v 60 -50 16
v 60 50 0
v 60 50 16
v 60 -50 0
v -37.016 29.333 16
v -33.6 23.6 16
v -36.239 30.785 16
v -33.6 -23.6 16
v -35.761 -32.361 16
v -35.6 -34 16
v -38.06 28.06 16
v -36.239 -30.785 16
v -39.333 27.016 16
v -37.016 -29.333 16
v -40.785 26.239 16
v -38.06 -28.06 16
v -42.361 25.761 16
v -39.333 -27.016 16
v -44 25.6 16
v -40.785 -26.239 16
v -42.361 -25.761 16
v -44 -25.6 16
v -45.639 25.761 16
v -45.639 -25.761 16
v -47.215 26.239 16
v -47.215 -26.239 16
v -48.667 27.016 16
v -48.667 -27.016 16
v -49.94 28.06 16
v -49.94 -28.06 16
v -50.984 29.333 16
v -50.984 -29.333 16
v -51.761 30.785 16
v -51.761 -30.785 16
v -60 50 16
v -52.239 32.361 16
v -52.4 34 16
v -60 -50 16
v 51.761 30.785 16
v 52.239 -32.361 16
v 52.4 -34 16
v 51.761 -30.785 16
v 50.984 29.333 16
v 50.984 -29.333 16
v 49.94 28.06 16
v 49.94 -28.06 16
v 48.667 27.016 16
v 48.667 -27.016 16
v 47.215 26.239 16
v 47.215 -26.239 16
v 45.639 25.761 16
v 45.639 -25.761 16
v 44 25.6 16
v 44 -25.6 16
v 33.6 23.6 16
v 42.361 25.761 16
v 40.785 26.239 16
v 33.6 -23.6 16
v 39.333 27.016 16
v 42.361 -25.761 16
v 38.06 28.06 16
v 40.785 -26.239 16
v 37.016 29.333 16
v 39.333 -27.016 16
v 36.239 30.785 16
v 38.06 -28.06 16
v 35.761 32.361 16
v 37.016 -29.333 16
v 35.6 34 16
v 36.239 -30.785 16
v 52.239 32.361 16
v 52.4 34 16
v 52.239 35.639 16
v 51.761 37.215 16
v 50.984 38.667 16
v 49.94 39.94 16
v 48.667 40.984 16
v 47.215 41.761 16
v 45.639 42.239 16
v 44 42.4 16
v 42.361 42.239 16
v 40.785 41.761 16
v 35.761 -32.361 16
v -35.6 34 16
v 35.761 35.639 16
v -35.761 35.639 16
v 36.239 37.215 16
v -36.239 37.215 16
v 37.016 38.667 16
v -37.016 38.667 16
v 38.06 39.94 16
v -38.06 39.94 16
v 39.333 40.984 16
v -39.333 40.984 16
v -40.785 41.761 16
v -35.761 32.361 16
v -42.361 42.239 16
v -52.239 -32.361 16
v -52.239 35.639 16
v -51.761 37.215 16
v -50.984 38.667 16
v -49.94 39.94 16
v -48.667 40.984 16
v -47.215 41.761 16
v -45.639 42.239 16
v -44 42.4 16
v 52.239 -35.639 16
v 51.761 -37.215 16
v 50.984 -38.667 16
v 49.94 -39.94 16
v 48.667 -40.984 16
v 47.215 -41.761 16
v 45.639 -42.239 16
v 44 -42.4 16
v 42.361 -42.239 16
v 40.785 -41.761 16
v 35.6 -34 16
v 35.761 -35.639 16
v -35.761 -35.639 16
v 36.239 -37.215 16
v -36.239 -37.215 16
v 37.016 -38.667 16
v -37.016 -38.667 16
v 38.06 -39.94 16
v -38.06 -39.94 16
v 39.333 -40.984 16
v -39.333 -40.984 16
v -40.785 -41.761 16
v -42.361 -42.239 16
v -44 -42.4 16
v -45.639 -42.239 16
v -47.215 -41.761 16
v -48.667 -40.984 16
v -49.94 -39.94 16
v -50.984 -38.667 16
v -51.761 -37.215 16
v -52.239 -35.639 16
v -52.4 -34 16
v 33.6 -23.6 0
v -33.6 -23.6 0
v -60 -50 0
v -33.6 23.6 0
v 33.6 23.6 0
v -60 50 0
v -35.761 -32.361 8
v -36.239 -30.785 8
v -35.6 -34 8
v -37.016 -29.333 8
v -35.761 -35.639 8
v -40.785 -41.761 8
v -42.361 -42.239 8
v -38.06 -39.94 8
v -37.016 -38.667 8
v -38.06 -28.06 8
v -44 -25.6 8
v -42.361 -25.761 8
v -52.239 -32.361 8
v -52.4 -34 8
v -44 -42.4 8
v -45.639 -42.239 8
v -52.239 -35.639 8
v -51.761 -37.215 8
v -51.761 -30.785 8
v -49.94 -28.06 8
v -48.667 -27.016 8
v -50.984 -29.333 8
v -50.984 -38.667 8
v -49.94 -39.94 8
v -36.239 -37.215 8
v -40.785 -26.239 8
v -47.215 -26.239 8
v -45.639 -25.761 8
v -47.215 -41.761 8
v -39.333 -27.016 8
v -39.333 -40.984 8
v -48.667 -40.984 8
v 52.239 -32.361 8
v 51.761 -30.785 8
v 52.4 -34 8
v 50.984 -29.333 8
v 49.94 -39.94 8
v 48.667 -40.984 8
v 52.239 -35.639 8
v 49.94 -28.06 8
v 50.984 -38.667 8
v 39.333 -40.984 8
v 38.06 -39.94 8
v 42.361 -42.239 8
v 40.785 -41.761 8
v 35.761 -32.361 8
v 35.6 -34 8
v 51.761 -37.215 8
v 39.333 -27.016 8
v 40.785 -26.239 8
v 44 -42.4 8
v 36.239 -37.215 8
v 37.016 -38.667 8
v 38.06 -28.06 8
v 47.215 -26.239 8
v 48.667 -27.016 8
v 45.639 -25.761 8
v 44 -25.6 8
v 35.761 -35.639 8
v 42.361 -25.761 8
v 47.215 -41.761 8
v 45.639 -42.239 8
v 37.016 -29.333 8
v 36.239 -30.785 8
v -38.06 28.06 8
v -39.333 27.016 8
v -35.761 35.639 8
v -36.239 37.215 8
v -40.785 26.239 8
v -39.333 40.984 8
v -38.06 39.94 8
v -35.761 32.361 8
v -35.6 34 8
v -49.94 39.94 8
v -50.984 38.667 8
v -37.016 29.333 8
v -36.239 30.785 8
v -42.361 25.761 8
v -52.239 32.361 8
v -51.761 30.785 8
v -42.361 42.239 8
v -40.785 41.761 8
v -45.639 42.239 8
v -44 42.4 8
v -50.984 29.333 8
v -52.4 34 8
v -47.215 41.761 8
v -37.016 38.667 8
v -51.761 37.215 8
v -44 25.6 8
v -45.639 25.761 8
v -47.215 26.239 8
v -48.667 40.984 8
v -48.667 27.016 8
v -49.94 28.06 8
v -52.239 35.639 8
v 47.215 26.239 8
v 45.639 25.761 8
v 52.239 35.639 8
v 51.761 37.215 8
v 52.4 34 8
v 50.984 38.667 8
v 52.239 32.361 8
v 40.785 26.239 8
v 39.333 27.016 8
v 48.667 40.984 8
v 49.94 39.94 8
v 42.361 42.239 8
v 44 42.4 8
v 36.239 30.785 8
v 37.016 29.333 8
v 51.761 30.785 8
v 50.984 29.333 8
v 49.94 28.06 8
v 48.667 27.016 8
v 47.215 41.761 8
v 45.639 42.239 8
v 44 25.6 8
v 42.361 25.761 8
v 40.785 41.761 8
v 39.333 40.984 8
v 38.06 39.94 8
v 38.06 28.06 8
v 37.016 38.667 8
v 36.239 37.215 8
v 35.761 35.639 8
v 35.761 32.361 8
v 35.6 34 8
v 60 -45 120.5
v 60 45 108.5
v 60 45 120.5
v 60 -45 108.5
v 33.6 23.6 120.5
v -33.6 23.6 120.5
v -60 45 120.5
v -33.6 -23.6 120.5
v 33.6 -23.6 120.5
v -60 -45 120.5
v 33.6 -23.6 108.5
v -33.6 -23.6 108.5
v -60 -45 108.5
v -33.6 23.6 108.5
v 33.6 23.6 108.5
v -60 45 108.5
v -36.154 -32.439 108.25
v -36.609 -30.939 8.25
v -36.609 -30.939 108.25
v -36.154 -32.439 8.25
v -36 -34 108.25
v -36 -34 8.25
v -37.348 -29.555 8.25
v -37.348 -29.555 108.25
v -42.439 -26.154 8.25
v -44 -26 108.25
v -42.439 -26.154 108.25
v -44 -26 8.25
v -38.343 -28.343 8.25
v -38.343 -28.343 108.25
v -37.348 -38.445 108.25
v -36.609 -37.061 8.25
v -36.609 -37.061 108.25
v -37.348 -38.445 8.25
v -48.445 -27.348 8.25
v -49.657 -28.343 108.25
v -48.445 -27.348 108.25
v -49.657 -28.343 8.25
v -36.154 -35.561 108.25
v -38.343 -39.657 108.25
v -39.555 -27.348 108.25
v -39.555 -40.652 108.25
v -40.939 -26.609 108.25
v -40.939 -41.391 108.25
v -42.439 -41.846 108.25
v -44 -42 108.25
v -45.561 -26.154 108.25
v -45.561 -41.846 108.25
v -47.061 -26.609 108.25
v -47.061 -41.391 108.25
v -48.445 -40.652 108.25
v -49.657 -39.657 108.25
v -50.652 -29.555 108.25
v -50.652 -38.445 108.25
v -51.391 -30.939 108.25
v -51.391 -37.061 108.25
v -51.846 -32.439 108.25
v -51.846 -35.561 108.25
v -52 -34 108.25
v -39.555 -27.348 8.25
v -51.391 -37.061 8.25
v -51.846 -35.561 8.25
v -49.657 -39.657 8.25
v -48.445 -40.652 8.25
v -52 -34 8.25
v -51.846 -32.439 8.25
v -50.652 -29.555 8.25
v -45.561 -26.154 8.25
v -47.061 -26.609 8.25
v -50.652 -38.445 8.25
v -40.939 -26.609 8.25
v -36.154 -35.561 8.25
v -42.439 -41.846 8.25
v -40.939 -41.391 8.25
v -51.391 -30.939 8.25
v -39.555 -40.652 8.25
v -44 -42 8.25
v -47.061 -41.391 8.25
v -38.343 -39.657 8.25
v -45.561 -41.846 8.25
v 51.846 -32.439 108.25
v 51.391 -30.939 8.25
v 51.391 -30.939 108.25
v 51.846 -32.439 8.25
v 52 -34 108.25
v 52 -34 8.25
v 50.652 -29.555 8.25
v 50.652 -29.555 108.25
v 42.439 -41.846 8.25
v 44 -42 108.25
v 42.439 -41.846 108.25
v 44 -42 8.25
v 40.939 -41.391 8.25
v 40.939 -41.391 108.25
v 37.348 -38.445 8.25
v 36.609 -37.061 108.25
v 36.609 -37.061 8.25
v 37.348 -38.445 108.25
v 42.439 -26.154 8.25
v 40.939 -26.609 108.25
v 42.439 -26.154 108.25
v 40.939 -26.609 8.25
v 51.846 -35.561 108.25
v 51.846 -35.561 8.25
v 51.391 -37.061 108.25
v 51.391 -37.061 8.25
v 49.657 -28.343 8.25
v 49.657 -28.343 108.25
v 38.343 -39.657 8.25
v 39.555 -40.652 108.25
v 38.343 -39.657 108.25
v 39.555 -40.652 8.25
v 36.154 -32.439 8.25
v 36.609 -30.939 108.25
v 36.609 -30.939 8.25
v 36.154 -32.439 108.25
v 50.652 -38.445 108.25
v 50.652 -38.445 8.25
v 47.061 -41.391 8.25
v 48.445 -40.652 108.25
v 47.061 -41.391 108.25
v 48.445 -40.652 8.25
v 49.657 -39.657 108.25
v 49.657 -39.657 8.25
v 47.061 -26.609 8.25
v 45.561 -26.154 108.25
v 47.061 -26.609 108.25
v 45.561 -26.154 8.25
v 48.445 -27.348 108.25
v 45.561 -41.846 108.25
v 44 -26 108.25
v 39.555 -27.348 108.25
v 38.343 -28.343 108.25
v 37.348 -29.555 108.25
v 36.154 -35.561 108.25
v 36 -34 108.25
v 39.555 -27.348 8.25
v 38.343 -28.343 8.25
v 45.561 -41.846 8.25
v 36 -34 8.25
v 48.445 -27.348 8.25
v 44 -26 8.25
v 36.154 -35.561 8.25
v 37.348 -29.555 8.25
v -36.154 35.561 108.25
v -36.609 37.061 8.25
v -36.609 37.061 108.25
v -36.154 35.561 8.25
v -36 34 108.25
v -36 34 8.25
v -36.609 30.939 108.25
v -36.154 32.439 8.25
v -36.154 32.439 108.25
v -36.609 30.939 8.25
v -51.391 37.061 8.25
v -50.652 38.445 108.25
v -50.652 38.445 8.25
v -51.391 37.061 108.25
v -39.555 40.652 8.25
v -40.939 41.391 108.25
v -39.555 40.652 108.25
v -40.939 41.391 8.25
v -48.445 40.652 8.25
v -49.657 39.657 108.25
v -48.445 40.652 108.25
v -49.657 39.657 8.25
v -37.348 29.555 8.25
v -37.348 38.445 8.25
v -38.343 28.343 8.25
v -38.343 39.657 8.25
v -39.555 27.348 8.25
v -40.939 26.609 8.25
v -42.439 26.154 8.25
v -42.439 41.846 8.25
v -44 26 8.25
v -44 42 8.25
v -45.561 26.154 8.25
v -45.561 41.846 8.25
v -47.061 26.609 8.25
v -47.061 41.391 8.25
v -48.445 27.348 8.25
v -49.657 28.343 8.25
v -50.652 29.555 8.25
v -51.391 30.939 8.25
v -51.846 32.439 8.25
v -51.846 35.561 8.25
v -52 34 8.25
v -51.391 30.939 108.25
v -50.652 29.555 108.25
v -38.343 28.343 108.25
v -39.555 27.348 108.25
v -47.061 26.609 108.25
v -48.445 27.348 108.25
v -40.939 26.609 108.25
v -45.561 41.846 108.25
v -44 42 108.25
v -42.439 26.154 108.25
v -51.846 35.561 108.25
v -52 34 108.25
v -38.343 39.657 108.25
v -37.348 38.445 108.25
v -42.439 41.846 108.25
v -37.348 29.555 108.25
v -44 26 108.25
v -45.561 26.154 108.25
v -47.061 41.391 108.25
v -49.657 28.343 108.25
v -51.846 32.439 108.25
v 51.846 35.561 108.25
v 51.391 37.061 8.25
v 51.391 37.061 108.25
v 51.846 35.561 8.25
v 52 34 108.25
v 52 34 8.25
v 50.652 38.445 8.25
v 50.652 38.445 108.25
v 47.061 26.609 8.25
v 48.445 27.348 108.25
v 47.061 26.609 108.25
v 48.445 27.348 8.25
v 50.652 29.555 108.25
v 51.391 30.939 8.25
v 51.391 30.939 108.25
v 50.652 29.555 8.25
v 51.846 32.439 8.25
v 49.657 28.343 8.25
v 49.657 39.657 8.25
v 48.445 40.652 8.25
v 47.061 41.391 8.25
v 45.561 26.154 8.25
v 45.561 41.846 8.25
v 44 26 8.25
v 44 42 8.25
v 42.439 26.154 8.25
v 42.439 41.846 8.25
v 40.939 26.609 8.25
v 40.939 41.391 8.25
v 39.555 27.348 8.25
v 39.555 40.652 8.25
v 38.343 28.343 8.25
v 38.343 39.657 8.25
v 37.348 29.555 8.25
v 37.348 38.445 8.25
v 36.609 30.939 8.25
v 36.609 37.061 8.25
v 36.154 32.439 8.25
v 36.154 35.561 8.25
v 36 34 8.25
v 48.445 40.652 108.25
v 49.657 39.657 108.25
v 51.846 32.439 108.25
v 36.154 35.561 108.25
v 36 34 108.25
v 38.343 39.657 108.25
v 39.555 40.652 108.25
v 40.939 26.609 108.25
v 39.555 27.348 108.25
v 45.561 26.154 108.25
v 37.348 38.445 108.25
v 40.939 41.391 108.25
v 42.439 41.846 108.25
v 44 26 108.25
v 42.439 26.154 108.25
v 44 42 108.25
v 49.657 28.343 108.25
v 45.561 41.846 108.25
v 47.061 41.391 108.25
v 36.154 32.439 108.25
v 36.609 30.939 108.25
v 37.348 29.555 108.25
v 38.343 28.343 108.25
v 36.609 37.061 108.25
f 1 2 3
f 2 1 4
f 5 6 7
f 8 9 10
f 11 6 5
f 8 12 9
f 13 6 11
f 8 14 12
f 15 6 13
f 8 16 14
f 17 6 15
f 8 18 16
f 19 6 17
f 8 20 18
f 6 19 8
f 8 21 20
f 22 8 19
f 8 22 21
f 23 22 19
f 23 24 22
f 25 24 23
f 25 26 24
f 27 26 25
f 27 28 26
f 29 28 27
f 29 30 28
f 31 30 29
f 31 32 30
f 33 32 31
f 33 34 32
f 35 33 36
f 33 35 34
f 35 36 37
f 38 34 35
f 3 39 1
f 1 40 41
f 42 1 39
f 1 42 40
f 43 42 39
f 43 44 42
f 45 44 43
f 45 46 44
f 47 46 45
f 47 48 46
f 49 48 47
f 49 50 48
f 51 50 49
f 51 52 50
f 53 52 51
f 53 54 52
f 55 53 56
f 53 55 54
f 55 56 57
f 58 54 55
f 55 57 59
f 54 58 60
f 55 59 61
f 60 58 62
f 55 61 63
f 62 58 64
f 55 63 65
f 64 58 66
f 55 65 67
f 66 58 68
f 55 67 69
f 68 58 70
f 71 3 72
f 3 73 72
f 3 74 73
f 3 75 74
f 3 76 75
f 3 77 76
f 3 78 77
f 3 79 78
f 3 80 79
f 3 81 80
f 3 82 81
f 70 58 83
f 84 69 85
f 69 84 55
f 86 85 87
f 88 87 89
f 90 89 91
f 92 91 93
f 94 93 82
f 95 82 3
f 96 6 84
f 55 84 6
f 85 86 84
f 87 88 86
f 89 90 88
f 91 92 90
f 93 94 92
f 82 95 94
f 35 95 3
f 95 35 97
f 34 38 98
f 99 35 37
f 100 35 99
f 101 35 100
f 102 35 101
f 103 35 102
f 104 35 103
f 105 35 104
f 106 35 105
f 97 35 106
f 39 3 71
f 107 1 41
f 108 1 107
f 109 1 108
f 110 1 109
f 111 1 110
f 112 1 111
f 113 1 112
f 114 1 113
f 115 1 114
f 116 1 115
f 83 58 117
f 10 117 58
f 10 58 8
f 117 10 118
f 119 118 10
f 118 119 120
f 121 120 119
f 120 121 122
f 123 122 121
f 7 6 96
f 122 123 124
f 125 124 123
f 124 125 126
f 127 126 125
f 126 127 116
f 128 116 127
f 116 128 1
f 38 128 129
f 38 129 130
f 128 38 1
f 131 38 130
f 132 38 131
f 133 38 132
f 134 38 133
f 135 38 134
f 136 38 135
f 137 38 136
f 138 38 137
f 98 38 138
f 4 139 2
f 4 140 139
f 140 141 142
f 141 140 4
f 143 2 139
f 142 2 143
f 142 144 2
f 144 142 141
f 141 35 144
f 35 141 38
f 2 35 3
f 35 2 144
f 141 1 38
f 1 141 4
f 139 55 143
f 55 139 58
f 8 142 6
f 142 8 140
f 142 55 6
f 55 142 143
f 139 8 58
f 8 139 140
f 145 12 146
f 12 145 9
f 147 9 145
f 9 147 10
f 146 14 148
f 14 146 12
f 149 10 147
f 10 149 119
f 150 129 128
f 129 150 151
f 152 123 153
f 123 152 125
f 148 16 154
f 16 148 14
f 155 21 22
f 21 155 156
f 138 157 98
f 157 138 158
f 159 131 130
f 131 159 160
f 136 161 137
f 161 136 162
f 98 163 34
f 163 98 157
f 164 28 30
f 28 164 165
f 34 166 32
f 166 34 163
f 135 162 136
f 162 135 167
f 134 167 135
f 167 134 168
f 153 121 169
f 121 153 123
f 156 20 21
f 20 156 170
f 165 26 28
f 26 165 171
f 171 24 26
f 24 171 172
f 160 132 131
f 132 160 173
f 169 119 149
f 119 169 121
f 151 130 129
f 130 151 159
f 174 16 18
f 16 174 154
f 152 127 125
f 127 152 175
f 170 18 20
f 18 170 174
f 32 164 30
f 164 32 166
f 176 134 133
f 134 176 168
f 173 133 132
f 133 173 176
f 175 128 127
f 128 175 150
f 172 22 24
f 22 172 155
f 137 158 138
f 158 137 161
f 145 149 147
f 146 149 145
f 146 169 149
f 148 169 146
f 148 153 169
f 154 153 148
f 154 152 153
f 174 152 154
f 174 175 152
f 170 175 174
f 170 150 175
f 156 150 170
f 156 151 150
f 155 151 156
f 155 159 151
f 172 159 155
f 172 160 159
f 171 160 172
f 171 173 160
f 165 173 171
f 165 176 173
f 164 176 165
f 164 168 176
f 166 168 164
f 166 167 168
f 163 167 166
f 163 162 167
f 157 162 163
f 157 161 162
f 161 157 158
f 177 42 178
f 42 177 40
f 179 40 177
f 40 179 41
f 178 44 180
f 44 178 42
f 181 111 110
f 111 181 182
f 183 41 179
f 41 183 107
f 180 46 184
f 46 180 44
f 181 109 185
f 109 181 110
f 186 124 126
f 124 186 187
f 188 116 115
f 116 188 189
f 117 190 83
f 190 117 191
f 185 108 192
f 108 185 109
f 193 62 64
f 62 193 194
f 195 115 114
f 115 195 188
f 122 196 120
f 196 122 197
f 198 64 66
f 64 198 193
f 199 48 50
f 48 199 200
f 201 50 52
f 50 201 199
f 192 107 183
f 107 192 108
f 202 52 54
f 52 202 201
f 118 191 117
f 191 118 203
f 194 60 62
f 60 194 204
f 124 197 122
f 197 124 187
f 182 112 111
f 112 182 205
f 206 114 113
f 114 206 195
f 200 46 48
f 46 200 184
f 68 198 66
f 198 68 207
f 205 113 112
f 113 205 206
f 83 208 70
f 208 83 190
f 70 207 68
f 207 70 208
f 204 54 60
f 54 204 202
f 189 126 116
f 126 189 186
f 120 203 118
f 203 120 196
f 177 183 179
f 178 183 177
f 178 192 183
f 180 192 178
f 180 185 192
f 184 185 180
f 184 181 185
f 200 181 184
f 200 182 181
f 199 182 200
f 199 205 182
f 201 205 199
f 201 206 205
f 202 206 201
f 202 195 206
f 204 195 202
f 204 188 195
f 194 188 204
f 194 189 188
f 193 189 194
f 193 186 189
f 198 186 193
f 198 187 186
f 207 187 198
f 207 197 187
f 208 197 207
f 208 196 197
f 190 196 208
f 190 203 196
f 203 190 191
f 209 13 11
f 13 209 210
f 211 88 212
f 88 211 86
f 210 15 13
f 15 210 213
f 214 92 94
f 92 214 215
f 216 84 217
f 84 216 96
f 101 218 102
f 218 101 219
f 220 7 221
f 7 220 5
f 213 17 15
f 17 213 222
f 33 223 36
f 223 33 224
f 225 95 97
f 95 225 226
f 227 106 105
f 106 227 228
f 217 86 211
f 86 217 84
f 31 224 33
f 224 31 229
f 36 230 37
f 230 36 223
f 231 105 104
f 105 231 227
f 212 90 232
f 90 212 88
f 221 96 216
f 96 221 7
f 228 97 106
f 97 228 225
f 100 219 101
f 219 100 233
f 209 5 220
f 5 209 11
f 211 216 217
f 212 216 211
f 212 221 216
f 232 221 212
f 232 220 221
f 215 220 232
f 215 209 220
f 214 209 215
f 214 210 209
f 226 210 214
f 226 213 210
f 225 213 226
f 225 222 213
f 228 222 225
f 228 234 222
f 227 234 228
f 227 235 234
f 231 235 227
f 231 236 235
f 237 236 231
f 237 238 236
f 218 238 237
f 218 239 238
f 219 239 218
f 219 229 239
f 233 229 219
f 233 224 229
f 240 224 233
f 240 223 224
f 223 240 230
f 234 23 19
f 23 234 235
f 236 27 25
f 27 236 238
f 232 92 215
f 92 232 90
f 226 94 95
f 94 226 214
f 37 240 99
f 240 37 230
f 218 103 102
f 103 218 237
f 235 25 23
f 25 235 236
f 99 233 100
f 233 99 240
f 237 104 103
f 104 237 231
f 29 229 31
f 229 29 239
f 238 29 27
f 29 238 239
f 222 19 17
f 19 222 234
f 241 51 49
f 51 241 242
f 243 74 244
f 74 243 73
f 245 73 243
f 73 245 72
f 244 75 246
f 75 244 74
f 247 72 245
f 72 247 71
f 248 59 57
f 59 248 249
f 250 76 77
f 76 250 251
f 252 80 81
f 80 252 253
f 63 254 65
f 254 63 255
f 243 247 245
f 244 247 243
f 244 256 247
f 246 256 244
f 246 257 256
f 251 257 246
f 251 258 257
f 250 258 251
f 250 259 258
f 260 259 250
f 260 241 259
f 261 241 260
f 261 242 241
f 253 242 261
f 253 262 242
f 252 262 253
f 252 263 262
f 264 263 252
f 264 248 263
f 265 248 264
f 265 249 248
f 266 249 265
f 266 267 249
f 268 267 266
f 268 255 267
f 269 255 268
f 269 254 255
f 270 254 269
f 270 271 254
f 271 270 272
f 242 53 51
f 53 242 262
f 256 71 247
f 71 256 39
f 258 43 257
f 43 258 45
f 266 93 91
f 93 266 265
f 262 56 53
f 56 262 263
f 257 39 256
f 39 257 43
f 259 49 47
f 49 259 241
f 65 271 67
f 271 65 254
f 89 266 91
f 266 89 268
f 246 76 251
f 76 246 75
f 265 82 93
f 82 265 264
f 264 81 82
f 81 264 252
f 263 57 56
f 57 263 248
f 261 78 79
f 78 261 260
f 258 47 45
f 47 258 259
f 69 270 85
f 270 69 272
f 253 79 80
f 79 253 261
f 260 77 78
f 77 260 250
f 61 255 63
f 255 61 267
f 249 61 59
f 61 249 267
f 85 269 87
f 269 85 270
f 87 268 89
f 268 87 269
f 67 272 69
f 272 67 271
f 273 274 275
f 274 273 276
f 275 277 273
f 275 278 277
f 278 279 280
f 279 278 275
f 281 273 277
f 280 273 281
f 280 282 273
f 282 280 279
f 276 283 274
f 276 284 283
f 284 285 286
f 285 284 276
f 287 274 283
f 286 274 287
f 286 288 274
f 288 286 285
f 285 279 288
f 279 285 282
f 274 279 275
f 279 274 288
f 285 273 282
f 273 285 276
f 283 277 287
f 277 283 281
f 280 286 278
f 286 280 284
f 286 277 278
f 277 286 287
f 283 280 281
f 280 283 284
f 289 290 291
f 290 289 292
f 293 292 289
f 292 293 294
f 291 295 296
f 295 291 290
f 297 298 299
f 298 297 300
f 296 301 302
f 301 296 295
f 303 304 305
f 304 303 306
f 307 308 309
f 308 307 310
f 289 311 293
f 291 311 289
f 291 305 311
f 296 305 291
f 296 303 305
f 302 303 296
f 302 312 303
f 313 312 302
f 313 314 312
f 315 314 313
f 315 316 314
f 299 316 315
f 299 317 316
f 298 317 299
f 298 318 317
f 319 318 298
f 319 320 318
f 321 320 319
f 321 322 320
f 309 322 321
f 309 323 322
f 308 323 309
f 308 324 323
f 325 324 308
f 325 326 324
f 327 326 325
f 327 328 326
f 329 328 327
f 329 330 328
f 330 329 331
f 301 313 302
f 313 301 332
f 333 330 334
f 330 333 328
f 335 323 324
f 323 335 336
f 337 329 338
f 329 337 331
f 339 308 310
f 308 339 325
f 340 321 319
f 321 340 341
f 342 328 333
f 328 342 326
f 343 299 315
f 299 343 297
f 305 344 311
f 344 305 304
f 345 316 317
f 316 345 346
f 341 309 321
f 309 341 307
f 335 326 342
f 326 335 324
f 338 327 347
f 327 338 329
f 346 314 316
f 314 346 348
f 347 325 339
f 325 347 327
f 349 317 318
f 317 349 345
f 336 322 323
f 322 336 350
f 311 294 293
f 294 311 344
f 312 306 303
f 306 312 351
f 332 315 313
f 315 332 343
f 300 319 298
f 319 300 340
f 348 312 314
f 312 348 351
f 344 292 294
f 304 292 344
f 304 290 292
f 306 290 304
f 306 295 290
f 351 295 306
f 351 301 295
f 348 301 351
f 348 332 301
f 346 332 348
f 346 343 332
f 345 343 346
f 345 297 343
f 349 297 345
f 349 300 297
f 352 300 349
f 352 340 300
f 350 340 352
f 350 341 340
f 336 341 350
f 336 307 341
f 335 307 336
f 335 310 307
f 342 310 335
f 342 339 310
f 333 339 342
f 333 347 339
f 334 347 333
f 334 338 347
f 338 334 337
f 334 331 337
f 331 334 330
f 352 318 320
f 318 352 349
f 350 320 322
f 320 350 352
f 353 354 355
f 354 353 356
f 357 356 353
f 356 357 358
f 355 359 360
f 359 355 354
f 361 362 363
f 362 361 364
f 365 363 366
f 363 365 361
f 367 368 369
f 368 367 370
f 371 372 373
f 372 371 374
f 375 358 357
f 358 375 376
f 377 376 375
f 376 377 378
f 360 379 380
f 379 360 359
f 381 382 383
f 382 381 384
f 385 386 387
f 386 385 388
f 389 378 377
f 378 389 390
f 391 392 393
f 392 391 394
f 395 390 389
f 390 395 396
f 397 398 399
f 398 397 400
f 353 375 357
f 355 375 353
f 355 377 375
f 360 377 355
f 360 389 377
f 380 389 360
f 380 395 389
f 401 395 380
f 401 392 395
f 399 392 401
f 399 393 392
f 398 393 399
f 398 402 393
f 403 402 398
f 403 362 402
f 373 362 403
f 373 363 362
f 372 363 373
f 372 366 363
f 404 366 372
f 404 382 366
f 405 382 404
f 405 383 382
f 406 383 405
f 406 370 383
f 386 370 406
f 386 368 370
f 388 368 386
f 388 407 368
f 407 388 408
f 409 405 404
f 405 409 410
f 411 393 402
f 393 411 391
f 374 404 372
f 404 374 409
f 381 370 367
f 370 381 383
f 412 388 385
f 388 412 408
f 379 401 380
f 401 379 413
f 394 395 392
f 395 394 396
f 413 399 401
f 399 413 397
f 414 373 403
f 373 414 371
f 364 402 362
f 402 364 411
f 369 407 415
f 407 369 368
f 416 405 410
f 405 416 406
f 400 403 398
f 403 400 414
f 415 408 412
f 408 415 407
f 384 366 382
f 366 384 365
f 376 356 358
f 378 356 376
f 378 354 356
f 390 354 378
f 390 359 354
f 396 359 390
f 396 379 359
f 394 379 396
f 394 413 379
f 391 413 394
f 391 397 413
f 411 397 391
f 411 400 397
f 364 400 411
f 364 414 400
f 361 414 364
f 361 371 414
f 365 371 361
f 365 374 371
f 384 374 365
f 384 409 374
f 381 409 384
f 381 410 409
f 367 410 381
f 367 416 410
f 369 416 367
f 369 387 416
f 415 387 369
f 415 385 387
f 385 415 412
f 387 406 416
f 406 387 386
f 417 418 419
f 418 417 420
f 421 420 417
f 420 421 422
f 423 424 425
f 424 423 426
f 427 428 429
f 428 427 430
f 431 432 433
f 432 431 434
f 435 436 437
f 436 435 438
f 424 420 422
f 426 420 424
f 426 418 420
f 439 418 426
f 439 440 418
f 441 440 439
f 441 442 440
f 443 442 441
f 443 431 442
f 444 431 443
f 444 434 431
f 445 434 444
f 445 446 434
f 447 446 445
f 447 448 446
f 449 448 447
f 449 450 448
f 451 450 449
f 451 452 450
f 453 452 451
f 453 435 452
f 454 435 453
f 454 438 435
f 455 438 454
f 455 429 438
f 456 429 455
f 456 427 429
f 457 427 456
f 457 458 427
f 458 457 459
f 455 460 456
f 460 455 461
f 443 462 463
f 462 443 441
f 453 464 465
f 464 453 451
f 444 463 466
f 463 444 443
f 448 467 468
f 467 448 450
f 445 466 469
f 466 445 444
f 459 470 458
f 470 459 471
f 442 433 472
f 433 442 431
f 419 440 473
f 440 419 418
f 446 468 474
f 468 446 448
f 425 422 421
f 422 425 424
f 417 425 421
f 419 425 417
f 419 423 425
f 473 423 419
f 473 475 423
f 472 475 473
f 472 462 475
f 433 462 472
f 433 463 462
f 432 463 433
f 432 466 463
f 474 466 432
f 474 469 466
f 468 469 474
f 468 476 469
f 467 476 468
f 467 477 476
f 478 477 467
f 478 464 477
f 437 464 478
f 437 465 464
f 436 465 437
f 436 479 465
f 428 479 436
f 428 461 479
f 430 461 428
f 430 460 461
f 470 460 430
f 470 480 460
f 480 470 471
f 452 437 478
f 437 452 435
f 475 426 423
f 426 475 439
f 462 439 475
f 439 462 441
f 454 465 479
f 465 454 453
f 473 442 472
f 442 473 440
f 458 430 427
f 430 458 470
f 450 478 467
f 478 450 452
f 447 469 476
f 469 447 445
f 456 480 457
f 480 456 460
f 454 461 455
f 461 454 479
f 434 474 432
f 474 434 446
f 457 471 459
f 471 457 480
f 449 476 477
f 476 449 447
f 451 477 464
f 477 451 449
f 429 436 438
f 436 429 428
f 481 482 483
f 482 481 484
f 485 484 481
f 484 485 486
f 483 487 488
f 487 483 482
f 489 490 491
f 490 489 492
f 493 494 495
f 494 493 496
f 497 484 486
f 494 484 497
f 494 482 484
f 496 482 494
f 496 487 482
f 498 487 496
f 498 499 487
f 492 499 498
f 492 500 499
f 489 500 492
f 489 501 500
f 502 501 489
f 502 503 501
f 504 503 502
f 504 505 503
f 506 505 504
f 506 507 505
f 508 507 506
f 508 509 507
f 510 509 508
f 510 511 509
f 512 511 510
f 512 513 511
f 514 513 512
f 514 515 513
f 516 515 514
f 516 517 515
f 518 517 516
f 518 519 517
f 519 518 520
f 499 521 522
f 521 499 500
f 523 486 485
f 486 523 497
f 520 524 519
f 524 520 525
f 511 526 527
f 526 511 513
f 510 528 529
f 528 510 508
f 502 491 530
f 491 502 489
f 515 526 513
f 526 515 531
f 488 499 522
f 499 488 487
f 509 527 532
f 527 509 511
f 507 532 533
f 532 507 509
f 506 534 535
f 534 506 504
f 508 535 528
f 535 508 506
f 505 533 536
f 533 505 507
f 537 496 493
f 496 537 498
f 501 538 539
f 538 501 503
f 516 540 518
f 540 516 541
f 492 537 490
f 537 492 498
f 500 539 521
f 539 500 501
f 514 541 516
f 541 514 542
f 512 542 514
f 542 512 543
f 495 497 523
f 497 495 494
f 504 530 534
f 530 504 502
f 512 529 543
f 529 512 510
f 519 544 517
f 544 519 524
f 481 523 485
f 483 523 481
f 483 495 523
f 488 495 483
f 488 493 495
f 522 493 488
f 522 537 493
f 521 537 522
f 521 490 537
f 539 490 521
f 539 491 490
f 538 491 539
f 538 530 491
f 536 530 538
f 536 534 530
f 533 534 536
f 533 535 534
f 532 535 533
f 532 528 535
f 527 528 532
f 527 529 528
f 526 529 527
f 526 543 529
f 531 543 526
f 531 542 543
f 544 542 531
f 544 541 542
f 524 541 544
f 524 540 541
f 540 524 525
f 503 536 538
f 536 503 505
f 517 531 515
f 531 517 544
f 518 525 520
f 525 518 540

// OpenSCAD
$fn = 32;

// ------------------------------------------------------------------------
// Frame cube: base 120 x 100 mm, posts 100 mm tall
// Every part is its own module, assembly() places every instance.
// ------------------------------------------------------------------------

// --- part 1 ---
module base_frame() {
  difference() {
    translate([-60, -50, 0]) cube([120, 100, 16]);
    translate([-33.6, -23.6, -1]) cube([67.2, 47.2, 18]);
    translate([-44, -34, 8]) cylinder(h = 9, d = 16.8);
    translate([44, -34, 8]) cylinder(h = 9, d = 16.8);
    translate([-44, 34, 8]) cylinder(h = 9, d = 16.8);
    translate([44, 34, 8]) cylinder(h = 9, d = 16.8);
  }
}

// --- part 2 ---
module corner_post() {
  cylinder(h = 100, d = 16);
}

// --- part 3 ---
module top_frame() {
  difference() {
    translate([-60, -45, 0]) cube([120, 90, 12]);
    translate([-33.6, -23.6, -1]) cube([67.2, 47.2, 14]);
  }
}

// --- assembly ---
module assembly() {
  color([0.80, 0.24, 0.20]) translate([0, 0, 0]) rotate([0, 0, 0]) base_frame();
  color([0.20, 0.45, 0.75]) translate([-44, -34, 8.25]) rotate([0, 0, 0]) corner_post();
  color([0.25, 0.62, 0.32]) translate([44, -34, 8.25]) rotate([0, 0, 0]) corner_post();
  color([0.92, 0.70, 0.18]) translate([-44, 34, 8.25]) rotate([0, 0, 0]) corner_post();
  color([0.58, 0.35, 0.70]) translate([44, 34, 8.25]) rotate([0, 0, 0]) corner_post();
  color([0.16, 0.66, 0.66]) translate([0, 0, 108.5]) rotate([0, 0, 0]) top_frame();
}

assembly();
